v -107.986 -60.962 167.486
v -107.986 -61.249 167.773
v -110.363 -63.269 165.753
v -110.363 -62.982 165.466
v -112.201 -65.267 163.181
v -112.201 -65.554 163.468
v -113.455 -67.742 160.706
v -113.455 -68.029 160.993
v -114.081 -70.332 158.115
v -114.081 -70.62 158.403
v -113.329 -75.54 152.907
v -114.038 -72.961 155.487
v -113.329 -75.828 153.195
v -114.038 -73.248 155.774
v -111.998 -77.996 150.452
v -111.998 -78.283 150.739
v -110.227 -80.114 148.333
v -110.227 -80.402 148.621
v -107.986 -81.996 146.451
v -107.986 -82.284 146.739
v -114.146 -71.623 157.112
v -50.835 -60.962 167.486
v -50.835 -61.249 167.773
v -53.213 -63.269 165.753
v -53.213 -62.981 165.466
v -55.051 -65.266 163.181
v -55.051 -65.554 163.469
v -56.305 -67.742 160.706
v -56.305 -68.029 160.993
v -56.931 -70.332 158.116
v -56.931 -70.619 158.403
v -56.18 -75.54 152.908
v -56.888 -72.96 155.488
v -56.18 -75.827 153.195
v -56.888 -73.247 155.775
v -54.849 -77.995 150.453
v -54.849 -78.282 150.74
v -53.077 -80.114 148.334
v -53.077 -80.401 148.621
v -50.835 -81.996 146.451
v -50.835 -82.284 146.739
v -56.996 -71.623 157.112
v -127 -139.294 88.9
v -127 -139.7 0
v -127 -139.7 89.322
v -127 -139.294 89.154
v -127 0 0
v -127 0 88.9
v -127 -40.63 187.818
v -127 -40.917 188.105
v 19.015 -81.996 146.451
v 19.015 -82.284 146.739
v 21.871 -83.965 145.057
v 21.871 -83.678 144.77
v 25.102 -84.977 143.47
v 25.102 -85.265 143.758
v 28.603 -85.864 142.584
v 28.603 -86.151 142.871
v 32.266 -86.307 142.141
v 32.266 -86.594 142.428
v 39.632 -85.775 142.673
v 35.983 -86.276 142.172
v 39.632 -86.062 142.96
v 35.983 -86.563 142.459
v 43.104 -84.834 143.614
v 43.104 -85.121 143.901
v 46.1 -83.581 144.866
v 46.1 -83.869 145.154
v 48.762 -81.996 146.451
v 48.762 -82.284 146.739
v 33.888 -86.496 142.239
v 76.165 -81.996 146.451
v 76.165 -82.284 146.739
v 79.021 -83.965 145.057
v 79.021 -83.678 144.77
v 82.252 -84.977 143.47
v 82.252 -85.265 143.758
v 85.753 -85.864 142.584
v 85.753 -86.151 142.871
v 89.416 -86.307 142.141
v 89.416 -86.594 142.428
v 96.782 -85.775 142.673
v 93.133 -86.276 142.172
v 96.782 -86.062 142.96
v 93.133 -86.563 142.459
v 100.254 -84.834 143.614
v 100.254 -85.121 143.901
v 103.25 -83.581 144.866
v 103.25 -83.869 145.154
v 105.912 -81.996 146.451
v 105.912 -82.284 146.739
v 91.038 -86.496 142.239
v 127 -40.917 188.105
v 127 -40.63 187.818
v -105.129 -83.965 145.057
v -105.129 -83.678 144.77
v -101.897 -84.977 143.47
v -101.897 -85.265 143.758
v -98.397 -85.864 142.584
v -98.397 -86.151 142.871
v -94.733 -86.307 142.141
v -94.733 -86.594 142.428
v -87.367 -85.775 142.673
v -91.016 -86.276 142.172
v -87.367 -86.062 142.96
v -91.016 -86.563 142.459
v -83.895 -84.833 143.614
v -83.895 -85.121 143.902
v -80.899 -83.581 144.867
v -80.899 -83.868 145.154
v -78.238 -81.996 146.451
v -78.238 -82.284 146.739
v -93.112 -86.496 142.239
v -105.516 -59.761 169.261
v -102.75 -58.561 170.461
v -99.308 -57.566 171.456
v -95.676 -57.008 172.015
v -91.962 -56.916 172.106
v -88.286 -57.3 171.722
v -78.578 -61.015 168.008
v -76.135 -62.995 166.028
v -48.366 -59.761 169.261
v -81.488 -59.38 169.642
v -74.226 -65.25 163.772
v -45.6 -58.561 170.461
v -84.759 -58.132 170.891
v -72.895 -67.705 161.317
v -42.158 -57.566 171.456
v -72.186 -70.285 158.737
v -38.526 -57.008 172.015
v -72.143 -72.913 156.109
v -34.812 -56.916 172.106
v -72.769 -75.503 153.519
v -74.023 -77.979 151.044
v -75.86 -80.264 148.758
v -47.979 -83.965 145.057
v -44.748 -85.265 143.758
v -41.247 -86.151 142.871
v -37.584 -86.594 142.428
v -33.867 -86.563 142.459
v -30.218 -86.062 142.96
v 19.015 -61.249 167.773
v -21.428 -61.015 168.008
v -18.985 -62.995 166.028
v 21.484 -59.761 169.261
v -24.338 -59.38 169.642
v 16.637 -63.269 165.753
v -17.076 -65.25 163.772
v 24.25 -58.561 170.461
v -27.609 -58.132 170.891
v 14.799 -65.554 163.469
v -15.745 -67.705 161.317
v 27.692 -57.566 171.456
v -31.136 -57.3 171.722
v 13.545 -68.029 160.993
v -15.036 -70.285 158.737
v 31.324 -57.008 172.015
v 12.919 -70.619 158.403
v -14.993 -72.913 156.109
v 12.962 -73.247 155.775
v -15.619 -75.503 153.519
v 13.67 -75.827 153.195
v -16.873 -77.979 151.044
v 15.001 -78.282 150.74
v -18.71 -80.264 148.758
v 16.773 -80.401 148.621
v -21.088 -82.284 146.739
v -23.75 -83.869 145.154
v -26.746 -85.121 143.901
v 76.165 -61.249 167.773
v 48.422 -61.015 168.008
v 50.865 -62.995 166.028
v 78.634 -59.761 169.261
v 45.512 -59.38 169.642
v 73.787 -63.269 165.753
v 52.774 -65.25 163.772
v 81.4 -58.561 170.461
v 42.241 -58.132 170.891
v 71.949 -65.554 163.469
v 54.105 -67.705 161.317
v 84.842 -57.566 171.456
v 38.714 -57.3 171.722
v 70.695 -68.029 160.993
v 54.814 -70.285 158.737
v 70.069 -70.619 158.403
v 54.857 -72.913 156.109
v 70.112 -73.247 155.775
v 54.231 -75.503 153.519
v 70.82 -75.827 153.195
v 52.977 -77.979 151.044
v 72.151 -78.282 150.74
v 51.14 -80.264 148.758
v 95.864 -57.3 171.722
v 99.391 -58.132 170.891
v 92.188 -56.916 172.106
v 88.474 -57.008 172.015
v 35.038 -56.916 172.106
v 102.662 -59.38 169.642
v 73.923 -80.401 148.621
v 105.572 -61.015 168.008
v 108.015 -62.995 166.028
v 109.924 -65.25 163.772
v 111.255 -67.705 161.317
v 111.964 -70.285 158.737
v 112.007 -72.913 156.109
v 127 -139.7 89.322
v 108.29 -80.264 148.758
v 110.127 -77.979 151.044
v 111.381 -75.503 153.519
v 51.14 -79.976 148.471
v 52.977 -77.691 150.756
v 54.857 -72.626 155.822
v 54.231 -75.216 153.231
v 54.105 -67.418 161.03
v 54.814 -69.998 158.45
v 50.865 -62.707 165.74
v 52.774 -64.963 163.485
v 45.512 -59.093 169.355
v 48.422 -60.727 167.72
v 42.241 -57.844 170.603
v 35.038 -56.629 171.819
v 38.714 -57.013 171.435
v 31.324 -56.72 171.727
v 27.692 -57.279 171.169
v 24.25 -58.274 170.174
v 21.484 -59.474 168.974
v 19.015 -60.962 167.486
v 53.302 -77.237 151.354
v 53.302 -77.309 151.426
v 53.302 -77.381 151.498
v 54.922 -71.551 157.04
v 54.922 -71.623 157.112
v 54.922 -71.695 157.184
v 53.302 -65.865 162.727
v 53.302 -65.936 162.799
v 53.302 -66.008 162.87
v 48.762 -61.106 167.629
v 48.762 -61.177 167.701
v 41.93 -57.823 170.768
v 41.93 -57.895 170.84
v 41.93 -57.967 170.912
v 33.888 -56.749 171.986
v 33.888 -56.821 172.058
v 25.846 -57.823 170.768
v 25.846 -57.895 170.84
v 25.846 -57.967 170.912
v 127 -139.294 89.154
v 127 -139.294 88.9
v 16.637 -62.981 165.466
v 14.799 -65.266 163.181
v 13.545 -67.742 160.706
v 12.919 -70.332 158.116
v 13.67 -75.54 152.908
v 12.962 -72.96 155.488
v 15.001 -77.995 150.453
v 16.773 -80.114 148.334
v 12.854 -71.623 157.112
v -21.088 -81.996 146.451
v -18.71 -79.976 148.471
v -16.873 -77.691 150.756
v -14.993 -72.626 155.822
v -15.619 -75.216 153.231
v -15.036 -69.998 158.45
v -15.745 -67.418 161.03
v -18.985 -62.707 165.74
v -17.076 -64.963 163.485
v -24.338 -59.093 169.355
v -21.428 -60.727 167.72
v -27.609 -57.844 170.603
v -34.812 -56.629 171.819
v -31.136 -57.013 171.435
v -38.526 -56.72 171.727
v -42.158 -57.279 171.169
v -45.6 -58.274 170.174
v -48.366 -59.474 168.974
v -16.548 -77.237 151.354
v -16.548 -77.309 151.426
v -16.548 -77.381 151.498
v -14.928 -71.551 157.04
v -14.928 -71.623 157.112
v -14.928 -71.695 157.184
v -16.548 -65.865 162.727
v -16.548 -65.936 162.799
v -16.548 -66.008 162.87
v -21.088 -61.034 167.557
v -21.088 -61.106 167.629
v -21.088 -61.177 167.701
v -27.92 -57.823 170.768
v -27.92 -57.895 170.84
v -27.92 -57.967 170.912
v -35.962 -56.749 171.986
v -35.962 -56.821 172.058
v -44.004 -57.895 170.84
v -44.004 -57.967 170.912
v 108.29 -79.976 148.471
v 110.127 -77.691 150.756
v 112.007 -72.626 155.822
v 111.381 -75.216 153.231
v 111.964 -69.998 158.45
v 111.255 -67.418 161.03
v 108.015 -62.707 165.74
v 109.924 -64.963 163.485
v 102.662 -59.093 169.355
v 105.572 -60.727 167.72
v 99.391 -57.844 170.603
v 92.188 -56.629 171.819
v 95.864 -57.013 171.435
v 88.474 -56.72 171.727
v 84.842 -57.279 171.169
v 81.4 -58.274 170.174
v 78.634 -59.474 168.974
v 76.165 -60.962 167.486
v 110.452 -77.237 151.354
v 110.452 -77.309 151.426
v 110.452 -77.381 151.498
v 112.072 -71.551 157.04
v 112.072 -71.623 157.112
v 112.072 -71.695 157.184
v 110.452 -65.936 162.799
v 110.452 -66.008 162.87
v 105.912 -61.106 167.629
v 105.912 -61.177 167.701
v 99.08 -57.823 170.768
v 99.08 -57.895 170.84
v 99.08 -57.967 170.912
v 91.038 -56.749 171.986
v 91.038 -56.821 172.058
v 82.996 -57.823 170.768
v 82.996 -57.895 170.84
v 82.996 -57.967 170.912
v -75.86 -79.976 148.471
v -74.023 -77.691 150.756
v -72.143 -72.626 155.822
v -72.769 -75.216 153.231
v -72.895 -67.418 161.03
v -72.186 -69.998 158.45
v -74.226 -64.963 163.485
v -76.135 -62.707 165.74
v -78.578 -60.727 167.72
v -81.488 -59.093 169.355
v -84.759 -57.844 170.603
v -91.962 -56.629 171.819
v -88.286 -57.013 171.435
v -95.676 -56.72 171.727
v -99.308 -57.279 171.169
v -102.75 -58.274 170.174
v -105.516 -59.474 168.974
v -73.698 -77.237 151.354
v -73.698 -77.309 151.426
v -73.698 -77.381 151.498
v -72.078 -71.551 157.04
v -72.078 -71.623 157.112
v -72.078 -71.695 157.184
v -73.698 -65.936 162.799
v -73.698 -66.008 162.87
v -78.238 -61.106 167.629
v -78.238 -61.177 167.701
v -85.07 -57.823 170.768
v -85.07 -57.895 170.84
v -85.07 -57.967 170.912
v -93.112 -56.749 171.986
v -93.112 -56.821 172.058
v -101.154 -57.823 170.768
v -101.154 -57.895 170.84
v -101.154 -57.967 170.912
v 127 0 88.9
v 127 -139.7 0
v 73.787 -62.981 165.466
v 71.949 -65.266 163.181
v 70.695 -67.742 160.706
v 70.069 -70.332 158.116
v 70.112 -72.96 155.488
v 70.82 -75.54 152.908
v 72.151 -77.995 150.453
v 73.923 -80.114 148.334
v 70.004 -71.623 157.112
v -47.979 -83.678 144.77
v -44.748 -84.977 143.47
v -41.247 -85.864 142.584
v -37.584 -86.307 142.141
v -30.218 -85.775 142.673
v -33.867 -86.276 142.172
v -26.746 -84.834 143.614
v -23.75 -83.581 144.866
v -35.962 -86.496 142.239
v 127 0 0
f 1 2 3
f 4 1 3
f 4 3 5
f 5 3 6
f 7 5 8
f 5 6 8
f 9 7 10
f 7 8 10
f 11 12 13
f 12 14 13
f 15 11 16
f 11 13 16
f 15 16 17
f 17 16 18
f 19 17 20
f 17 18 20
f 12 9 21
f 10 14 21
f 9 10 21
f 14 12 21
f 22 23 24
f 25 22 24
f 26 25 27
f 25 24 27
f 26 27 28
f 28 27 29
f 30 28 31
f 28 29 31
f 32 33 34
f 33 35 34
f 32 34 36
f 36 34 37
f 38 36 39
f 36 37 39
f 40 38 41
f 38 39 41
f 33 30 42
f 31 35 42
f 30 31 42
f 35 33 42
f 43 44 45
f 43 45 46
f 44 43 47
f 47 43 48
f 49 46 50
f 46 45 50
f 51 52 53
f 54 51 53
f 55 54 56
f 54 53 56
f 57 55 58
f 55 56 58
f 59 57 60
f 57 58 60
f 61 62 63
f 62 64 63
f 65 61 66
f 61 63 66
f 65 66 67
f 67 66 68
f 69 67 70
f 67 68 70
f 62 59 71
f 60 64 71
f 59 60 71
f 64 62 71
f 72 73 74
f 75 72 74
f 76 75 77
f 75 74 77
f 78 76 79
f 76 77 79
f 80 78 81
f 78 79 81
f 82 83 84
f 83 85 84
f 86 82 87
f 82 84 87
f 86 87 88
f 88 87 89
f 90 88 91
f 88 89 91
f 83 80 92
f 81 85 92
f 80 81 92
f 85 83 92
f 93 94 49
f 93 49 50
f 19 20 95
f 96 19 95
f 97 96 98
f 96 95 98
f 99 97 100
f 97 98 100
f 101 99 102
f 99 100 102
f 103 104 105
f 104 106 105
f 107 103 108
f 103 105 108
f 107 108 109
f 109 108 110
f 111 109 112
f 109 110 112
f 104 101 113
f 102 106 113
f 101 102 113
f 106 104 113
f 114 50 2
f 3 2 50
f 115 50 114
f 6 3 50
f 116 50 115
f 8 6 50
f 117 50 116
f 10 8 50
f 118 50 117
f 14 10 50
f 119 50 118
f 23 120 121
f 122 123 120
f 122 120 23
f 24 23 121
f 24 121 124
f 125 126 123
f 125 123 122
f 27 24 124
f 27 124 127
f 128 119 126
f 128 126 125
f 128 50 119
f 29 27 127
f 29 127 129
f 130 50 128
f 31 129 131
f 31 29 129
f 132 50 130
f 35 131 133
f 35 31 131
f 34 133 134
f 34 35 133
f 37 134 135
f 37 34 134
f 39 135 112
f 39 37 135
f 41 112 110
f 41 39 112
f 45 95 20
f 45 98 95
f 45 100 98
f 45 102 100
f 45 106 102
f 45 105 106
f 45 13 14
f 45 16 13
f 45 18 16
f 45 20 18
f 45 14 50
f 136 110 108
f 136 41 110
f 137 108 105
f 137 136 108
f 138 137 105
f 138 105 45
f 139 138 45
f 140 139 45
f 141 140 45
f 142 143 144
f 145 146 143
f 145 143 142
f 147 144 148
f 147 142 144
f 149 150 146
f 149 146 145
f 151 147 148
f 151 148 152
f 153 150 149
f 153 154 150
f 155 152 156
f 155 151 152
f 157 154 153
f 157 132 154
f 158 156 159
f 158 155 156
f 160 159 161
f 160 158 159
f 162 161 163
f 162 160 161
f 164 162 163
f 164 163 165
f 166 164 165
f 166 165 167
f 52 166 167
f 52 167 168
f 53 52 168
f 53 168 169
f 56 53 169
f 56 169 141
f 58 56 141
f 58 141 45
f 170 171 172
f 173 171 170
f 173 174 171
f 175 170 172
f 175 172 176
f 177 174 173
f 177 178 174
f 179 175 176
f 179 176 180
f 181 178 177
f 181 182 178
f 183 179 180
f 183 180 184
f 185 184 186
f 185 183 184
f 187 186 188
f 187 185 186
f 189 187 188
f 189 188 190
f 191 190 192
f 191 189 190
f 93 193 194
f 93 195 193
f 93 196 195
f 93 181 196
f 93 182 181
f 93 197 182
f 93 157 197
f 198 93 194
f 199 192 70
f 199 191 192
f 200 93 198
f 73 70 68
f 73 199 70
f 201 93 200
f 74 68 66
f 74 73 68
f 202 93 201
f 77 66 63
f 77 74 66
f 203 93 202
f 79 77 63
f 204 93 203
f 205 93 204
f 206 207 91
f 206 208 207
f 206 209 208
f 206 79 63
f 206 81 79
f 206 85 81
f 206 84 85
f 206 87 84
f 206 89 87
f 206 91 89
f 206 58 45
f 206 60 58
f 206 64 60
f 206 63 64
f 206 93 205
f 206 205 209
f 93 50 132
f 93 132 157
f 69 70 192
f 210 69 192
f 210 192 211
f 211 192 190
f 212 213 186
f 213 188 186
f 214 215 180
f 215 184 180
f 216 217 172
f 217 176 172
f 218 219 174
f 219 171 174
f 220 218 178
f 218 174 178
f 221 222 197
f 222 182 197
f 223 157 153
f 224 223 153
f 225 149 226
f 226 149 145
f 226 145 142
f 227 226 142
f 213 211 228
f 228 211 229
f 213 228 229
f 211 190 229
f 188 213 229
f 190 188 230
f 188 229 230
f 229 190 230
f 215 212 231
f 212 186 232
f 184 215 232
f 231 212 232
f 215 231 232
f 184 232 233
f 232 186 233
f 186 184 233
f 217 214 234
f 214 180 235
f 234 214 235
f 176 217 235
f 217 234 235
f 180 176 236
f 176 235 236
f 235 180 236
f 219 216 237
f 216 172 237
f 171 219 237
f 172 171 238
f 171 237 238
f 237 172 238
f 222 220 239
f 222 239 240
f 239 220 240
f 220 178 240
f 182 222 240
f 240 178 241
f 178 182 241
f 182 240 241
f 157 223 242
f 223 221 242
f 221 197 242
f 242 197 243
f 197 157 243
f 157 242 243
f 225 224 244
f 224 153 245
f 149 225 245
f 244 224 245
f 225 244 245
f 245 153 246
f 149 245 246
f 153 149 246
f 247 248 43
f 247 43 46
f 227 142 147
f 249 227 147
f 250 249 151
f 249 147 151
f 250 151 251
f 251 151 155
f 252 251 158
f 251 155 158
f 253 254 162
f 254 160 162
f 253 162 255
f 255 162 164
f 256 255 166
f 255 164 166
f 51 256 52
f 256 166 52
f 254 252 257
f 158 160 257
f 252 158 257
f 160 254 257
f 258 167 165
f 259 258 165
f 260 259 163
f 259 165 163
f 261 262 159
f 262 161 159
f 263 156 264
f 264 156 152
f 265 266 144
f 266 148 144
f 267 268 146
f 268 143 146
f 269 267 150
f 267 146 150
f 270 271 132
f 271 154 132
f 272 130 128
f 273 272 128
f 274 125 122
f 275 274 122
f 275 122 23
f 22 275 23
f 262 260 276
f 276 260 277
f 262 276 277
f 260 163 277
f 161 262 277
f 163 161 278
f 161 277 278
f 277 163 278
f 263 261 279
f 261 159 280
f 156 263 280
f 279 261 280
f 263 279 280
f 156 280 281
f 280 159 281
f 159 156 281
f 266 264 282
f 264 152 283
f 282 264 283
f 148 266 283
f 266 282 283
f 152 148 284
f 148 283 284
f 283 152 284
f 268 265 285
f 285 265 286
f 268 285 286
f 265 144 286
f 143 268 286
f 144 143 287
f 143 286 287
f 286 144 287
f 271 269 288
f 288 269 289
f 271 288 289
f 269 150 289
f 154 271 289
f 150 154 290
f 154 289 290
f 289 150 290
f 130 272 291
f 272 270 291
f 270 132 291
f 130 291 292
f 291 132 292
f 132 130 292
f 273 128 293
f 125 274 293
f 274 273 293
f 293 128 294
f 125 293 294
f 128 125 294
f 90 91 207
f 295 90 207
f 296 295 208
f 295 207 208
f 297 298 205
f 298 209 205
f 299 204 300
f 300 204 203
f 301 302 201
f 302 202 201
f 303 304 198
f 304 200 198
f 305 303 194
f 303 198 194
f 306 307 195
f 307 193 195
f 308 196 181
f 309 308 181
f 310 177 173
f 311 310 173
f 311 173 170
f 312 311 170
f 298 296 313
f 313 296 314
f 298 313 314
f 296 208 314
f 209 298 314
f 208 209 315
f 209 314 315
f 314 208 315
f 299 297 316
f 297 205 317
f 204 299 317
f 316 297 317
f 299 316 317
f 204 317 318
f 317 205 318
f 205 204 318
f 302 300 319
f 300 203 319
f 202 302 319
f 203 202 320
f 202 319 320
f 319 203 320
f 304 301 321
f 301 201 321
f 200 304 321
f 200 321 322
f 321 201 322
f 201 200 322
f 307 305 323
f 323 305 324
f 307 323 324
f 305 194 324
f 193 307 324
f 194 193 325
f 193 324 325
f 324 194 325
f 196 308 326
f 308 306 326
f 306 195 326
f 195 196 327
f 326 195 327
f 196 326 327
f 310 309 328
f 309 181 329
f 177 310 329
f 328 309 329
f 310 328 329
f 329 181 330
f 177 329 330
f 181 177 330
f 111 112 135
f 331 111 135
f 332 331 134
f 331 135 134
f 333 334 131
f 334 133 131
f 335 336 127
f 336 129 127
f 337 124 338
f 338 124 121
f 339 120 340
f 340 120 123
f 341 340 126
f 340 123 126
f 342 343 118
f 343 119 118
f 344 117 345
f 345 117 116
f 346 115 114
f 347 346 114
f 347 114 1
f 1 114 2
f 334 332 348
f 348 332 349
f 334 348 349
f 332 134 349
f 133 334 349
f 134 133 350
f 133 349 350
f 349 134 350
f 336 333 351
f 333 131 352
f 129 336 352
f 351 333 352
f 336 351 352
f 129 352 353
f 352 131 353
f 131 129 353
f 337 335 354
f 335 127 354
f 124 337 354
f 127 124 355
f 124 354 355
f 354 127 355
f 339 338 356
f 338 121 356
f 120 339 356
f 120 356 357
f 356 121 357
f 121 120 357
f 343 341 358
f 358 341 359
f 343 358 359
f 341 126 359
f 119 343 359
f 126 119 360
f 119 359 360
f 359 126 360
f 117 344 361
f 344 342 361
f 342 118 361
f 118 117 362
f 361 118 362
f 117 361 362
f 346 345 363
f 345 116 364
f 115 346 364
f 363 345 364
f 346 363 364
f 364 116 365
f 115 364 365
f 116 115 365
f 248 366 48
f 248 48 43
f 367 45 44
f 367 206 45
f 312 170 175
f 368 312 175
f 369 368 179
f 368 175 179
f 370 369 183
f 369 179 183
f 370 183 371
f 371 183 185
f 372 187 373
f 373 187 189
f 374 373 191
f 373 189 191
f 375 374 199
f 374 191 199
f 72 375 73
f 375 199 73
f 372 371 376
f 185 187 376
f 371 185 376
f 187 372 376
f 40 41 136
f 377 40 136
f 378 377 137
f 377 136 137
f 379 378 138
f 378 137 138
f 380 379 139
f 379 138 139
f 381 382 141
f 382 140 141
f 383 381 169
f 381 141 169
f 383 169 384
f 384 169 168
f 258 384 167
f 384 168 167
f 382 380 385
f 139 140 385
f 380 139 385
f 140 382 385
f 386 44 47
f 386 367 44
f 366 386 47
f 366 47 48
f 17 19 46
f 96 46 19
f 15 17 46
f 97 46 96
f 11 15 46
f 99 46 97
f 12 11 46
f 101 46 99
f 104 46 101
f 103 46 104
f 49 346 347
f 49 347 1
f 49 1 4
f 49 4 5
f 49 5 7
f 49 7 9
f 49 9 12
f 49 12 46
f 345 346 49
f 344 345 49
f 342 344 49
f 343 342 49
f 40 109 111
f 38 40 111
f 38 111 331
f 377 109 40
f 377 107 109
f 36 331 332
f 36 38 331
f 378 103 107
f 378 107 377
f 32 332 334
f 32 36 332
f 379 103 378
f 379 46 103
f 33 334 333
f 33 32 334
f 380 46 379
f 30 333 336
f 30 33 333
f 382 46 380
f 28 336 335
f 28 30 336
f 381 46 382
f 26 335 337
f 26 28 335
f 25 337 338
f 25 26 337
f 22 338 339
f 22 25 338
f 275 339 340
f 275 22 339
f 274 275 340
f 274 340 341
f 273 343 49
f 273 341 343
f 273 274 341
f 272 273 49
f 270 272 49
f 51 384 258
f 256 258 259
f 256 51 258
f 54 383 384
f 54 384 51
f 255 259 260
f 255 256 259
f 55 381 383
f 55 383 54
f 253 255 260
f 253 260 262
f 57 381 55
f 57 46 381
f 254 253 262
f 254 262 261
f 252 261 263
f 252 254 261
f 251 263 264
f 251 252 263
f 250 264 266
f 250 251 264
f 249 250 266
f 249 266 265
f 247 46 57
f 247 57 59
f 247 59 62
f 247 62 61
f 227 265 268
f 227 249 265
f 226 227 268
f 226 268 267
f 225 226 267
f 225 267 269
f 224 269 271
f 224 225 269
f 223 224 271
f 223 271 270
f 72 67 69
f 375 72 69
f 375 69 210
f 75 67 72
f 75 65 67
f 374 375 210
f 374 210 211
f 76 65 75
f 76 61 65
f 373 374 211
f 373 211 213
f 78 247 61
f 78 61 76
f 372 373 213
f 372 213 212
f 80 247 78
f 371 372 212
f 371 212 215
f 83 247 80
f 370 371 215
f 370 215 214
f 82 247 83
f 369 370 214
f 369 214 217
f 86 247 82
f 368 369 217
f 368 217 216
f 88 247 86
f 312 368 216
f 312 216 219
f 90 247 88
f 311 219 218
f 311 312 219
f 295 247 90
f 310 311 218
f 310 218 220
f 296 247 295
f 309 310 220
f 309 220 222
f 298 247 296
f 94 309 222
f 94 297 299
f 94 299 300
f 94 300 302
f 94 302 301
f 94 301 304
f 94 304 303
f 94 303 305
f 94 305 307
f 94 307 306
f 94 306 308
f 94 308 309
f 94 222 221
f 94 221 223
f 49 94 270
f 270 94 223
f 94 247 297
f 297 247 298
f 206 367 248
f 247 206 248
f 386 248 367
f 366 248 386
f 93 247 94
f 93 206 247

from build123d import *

# Parameters (mm, degrees)
F1_DEPTH = 127
F3_DEPTH = 0.4064


# Not quite as in the source:
# - the dataset's text gives a spline's control points without its knots; the knots are read off the source's solid


with BuildPart() as f1:
    # F0 (on Right) → F1 (new body, symmetric)
    with BuildSketch(Plane.YZ):
        Polygon((-139.7, 0), (0, 0), (0, 88.9), (-139.2936, 88.9), (-139.2936, 89.154), (-40.6298144724, 187.8177855276), (-40.9171826682, 188.1051537235), (-139.7, 89.3223363917), align=None)
    extrude(amount=F1_DEPTH, both=True)

    # F2 (on face) → F3 (cut, through all)
    with BuildSketch(Plane(origin=(0, -114.5111681959, 114.5111681959), x_dir=(1, 0, 0), z_dir=(0, -0.7071067812, 0.7071067812))):
        with BuildLine():
            add(Edge.make_bspline(
                [(-21.0882612312, 45.5766371575), (-17.1946190312, 49.4705841575), (-14.9277452312, 54.9434713575), (-14.9277452312, 60.4501405575), (-14.9277452312, 65.9570891575), (-17.1946190312, 71.4299763575), (-21.0882612312, 75.3236185575), (-24.9822590312, 79.2176163575), (-30.4551462312, 81.4845155575), (-35.9621202312, 81.4845155575)],
                knots=[5, 5, 5, 5, 6, 6, 6, 7, 7, 7, 8, 8, 8, 8], degree=3))
            add(Edge.make_bspline(
                [(-35.9621202312, 81.4845155575), (-41.4687640312, 81.4845155575), (-46.9416512312, 79.2176163575), (-50.8352934312, 75.3236185575)],
                knots=[0, 0, 0, 0, 1, 1, 1, 1], degree=3))
            add(Edge.make_bspline(
                [(-50.8352934312, 75.3236185575), (-54.7292912312, 71.4299763575), (-56.9964952312, 65.9570891575), (-56.9964952312, 60.4501405575), (-56.9964952312, 54.9434713575), (-54.7292912312, 49.4705841575), (-50.8352934312, 45.5766371575)],
                knots=[1, 1, 1, 1, 2, 2, 2, 3, 3, 3, 3], degree=3))
            add(Edge.make_bspline(
                [(-50.8352934312, 45.5766371575), (-46.9416512312, 41.6829441575), (-41.4687640312, 39.4157655575), (-35.9621202312, 39.4157655575), (-30.4551462312, 39.4157655575), (-24.9822590312, 41.6829441575), (-21.0882612312, 45.5766371575)],
                knots=[3, 3, 3, 3, 4, 4, 4, 5, 5, 5, 5], degree=3))
        make_face()
        with BuildLine():
            add(Edge.make_bspline(
                [(48.7617387688, 45.5766371575), (52.6553809688, 49.4705841575), (54.9222547688, 54.9434713575), (54.9222547688, 60.4501405575), (54.9222547688, 65.9570891575), (52.6553809688, 71.4299763575), (48.7617387688, 75.3236185575), (44.8677409688, 79.2176163575), (39.3948537688, 81.4845155575), (33.8878797688, 81.4845155575)],
                knots=[5, 5, 5, 5, 6, 6, 6, 7, 7, 7, 8, 8, 8, 8], degree=3))
            add(Edge.make_bspline(
                [(33.8878797688, 81.4845155575), (28.3812359688, 81.4845155575), (22.9083487688, 79.2176163575), (19.0147065688, 75.3236185575)],
                knots=[0, 0, 0, 0, 1, 1, 1, 1], degree=3))
            add(Edge.make_bspline(
                [(19.0147065688, 75.3236185575), (15.1207087688, 71.4299763575), (12.8535047688, 65.9570891575), (12.8535047688, 60.4501405575), (12.8535047688, 54.9434713575), (15.1207087688, 49.4705841575), (19.0147065688, 45.5766371575)],
                knots=[1, 1, 1, 1, 2, 2, 2, 3, 3, 3, 3], degree=3))
            add(Edge.make_bspline(
                [(19.0147065688, 45.5766371575), (22.9083487688, 41.6829441575), (28.3812359688, 39.4157655575), (33.8878797688, 39.4157655575), (39.3948537688, 39.4157655575), (44.8677409688, 41.6829441575), (48.7617387688, 45.5766371575)],
                knots=[3, 3, 3, 3, 4, 4, 4, 5, 5, 5, 5], degree=3))
        make_face()
        with BuildLine():
            add(Edge.make_bspline(
                [(105.9117387688, 45.5766371575), (109.8053809688, 49.4705841575), (112.0722547688, 54.9434713575), (112.0722547688, 60.4501405575), (112.0722547688, 65.9570891575), (109.8053809688, 71.4299763575), (105.9117387688, 75.3236185575), (102.0177409688, 79.2176163575), (96.5448537688, 81.4845155575), (91.0378797688, 81.4845155575)],
                knots=[5, 5, 5, 5, 6, 6, 6, 7, 7, 7, 8, 8, 8, 8], degree=3))
            add(Edge.make_bspline(
                [(91.0378797688, 81.4845155575), (85.5312359688, 81.4845155575), (80.0583487688, 79.2176163575), (76.1647065688, 75.3236185575)],
                knots=[0, 0, 0, 0, 1, 1, 1, 1], degree=3))
            add(Edge.make_bspline(
                [(76.1647065688, 75.3236185575), (72.2707087688, 71.4299763575), (70.0035047688, 65.9570891575), (70.0035047688, 60.4501405575), (70.0035047688, 54.9434713575), (72.2707087688, 49.4705841575), (76.1647065688, 45.5766371575)],
                knots=[1, 1, 1, 1, 2, 2, 2, 3, 3, 3, 3], degree=3))
            add(Edge.make_bspline(
                [(76.1647065688, 45.5766371575), (80.0583487688, 41.6829441575), (85.5312359688, 39.4157655575), (91.0378797688, 39.4157655575), (96.5448537688, 39.4157655575), (102.0177409688, 41.6829441575), (105.9117387688, 45.5766371575)],
                knots=[3, 3, 3, 3, 4, 4, 4, 5, 5, 5, 5], degree=3))
        make_face()
        with BuildLine():
            add(Edge.make_bspline(
                [(-78.2382612312, 45.5766371575), (-74.3446190312, 49.4705841575), (-72.0777452312, 54.9434713575), (-72.0777452312, 60.4501405575), (-72.0777452312, 65.9570891575), (-74.3446190312, 71.4299763575), (-78.2382612312, 75.3236185575), (-82.1322590312, 79.2176163575), (-87.6051462312, 81.4845155575), (-93.1121202312, 81.4845155575)],
                knots=[5, 5, 5, 5, 6, 6, 6, 7, 7, 7, 8, 8, 8, 8], degree=3))
            add(Edge.make_bspline(
                [(-93.1121202312, 81.4845155575), (-98.6187640312, 81.4845155575), (-104.0916512312, 79.2176163575), (-107.9855982312, 75.3236185575)],
                knots=[0, 0, 0, 0, 1, 1, 1, 1], degree=3))
            add(Edge.make_bspline(
                [(-107.9855982312, 75.3236185575), (-111.8792912312, 71.4299763575), (-114.1464952312, 65.9570891575), (-114.1464952312, 60.4501405575), (-114.1464952312, 54.9434713575), (-111.8792912312, 49.4705841575), (-107.9855982312, 45.5766371575)],
                knots=[1, 1, 1, 1, 2, 2, 2, 3, 3, 3, 3], degree=3))
            add(Edge.make_bspline(
                [(-107.9855982312, 45.5766371575), (-104.0916512312, 41.6829441575), (-98.6187640312, 39.4157655575), (-93.1121202312, 39.4157655575), (-87.6051462312, 39.4157655575), (-82.1322590312, 41.6829441575), (-78.2382612312, 45.5766371575)],
                knots=[3, 3, 3, 3, 4, 4, 4, 5, 5, 5, 5], degree=3))
        make_face()
    extrude(amount=-F3_DEPTH, mode=Mode.SUBTRACT)


solid = f1.part
